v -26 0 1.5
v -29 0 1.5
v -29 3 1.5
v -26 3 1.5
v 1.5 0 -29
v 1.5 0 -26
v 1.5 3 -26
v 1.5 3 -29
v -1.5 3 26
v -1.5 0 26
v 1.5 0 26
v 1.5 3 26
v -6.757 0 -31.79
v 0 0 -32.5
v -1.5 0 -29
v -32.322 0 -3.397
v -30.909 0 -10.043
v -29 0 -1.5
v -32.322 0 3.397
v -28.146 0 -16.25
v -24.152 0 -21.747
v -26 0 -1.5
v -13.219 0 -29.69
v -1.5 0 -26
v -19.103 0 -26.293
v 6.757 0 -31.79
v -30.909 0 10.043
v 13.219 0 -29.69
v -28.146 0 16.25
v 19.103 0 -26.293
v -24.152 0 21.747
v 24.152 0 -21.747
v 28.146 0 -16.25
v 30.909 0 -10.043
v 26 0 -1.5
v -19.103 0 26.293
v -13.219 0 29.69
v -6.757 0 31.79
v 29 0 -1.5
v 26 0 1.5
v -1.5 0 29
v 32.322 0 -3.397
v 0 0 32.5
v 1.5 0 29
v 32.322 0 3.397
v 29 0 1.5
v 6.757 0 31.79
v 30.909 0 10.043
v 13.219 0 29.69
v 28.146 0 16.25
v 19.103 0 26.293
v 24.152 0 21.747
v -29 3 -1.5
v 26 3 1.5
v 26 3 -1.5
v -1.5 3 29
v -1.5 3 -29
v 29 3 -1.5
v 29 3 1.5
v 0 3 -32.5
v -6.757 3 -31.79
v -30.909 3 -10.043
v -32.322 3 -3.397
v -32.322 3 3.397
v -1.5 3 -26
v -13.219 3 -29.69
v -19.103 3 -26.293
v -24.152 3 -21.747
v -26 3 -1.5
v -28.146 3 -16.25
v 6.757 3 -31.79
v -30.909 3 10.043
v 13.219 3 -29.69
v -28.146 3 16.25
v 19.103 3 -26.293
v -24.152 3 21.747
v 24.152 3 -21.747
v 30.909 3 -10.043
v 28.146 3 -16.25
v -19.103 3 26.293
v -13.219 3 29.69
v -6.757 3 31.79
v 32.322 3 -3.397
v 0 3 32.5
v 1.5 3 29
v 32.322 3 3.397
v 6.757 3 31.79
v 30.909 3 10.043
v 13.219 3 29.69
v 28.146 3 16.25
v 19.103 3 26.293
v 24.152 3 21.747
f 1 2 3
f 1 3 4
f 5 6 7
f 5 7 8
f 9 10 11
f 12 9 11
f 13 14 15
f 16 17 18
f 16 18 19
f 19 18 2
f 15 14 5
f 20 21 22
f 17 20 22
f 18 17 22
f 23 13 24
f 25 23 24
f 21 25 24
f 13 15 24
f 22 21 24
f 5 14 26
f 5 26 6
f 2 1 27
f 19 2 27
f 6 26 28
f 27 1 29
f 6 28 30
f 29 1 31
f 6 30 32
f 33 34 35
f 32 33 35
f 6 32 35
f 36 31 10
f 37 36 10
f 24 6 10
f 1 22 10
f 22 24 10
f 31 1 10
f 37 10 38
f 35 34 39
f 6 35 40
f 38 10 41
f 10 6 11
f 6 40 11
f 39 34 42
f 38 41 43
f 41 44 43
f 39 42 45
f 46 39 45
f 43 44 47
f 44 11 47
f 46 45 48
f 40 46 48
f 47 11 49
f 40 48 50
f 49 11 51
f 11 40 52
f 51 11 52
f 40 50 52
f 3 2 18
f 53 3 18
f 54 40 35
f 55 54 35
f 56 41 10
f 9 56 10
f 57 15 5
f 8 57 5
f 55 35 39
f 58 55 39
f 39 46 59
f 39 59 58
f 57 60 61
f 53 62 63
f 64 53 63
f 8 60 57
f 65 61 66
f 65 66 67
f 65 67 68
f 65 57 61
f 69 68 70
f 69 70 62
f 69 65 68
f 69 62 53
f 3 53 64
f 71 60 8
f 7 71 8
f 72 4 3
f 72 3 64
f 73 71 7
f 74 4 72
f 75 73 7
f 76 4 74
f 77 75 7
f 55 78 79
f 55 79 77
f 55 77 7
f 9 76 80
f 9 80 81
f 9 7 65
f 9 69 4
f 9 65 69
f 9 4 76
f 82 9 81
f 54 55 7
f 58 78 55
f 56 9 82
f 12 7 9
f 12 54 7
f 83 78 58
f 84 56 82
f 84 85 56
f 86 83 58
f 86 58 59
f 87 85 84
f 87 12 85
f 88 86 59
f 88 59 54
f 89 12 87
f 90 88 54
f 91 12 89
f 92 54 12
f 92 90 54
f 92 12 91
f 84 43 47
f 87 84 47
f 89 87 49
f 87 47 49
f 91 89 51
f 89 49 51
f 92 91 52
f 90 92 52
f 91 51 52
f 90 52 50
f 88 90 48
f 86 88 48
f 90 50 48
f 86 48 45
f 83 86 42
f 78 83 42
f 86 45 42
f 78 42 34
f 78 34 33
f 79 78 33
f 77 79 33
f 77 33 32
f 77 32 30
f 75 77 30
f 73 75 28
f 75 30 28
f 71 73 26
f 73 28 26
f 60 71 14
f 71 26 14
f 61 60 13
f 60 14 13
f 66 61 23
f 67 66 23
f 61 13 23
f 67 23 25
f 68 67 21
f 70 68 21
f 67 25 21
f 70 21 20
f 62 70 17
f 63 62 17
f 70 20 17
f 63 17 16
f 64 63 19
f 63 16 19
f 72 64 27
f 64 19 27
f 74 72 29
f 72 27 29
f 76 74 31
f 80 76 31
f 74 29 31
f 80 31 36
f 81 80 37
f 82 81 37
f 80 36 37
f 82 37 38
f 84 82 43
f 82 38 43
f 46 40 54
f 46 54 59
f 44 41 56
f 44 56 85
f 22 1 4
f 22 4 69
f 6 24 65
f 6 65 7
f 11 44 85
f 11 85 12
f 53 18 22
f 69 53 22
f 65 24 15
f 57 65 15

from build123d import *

# Parameters (mm, degrees)
SKETCH1_R           = 32.5
BOSS_EXTRUDE1_DEPTH = 3
SKETCH3_W           = 3
SKETCH3_H           = 3
CUT_EXTRUDE4_DEPTH  = 10


with BuildPart() as part:
    # Sketch1 → Boss-Extrude1 (new body)
    with BuildSketch(Plane(origin=(0, 0, 0), x_dir=(1, 0, 0), z_dir=(0, 1, 0))):
        with Locations(Location((0, 0, 0), (0, 0, 270))):
            Circle(SKETCH1_R)
    extrude(amount=BOSS_EXTRUDE1_DEPTH)

    # Sketch3 → Cut-Extrude4 (cut)
    with BuildSketch(Plane(origin=(0, 0, 0), x_dir=(1, 0, 0), z_dir=(0, 1, 0))):
        with Locations((27.5, 0)):
            Rectangle(SKETCH3_W, SKETCH3_H)
        with Locations((0, 27.5)):
            Rectangle(SKETCH3_W, SKETCH3_H)
        with Locations((0, -27.5)):
            Rectangle(SKETCH3_W, SKETCH3_H)
        with Locations((-27.5, 0)):
            Rectangle(SKETCH3_W, SKETCH3_H)
    extrude(amount=CUT_EXTRUDE4_DEPTH, mode=Mode.SUBTRACT)


solid = part.part
